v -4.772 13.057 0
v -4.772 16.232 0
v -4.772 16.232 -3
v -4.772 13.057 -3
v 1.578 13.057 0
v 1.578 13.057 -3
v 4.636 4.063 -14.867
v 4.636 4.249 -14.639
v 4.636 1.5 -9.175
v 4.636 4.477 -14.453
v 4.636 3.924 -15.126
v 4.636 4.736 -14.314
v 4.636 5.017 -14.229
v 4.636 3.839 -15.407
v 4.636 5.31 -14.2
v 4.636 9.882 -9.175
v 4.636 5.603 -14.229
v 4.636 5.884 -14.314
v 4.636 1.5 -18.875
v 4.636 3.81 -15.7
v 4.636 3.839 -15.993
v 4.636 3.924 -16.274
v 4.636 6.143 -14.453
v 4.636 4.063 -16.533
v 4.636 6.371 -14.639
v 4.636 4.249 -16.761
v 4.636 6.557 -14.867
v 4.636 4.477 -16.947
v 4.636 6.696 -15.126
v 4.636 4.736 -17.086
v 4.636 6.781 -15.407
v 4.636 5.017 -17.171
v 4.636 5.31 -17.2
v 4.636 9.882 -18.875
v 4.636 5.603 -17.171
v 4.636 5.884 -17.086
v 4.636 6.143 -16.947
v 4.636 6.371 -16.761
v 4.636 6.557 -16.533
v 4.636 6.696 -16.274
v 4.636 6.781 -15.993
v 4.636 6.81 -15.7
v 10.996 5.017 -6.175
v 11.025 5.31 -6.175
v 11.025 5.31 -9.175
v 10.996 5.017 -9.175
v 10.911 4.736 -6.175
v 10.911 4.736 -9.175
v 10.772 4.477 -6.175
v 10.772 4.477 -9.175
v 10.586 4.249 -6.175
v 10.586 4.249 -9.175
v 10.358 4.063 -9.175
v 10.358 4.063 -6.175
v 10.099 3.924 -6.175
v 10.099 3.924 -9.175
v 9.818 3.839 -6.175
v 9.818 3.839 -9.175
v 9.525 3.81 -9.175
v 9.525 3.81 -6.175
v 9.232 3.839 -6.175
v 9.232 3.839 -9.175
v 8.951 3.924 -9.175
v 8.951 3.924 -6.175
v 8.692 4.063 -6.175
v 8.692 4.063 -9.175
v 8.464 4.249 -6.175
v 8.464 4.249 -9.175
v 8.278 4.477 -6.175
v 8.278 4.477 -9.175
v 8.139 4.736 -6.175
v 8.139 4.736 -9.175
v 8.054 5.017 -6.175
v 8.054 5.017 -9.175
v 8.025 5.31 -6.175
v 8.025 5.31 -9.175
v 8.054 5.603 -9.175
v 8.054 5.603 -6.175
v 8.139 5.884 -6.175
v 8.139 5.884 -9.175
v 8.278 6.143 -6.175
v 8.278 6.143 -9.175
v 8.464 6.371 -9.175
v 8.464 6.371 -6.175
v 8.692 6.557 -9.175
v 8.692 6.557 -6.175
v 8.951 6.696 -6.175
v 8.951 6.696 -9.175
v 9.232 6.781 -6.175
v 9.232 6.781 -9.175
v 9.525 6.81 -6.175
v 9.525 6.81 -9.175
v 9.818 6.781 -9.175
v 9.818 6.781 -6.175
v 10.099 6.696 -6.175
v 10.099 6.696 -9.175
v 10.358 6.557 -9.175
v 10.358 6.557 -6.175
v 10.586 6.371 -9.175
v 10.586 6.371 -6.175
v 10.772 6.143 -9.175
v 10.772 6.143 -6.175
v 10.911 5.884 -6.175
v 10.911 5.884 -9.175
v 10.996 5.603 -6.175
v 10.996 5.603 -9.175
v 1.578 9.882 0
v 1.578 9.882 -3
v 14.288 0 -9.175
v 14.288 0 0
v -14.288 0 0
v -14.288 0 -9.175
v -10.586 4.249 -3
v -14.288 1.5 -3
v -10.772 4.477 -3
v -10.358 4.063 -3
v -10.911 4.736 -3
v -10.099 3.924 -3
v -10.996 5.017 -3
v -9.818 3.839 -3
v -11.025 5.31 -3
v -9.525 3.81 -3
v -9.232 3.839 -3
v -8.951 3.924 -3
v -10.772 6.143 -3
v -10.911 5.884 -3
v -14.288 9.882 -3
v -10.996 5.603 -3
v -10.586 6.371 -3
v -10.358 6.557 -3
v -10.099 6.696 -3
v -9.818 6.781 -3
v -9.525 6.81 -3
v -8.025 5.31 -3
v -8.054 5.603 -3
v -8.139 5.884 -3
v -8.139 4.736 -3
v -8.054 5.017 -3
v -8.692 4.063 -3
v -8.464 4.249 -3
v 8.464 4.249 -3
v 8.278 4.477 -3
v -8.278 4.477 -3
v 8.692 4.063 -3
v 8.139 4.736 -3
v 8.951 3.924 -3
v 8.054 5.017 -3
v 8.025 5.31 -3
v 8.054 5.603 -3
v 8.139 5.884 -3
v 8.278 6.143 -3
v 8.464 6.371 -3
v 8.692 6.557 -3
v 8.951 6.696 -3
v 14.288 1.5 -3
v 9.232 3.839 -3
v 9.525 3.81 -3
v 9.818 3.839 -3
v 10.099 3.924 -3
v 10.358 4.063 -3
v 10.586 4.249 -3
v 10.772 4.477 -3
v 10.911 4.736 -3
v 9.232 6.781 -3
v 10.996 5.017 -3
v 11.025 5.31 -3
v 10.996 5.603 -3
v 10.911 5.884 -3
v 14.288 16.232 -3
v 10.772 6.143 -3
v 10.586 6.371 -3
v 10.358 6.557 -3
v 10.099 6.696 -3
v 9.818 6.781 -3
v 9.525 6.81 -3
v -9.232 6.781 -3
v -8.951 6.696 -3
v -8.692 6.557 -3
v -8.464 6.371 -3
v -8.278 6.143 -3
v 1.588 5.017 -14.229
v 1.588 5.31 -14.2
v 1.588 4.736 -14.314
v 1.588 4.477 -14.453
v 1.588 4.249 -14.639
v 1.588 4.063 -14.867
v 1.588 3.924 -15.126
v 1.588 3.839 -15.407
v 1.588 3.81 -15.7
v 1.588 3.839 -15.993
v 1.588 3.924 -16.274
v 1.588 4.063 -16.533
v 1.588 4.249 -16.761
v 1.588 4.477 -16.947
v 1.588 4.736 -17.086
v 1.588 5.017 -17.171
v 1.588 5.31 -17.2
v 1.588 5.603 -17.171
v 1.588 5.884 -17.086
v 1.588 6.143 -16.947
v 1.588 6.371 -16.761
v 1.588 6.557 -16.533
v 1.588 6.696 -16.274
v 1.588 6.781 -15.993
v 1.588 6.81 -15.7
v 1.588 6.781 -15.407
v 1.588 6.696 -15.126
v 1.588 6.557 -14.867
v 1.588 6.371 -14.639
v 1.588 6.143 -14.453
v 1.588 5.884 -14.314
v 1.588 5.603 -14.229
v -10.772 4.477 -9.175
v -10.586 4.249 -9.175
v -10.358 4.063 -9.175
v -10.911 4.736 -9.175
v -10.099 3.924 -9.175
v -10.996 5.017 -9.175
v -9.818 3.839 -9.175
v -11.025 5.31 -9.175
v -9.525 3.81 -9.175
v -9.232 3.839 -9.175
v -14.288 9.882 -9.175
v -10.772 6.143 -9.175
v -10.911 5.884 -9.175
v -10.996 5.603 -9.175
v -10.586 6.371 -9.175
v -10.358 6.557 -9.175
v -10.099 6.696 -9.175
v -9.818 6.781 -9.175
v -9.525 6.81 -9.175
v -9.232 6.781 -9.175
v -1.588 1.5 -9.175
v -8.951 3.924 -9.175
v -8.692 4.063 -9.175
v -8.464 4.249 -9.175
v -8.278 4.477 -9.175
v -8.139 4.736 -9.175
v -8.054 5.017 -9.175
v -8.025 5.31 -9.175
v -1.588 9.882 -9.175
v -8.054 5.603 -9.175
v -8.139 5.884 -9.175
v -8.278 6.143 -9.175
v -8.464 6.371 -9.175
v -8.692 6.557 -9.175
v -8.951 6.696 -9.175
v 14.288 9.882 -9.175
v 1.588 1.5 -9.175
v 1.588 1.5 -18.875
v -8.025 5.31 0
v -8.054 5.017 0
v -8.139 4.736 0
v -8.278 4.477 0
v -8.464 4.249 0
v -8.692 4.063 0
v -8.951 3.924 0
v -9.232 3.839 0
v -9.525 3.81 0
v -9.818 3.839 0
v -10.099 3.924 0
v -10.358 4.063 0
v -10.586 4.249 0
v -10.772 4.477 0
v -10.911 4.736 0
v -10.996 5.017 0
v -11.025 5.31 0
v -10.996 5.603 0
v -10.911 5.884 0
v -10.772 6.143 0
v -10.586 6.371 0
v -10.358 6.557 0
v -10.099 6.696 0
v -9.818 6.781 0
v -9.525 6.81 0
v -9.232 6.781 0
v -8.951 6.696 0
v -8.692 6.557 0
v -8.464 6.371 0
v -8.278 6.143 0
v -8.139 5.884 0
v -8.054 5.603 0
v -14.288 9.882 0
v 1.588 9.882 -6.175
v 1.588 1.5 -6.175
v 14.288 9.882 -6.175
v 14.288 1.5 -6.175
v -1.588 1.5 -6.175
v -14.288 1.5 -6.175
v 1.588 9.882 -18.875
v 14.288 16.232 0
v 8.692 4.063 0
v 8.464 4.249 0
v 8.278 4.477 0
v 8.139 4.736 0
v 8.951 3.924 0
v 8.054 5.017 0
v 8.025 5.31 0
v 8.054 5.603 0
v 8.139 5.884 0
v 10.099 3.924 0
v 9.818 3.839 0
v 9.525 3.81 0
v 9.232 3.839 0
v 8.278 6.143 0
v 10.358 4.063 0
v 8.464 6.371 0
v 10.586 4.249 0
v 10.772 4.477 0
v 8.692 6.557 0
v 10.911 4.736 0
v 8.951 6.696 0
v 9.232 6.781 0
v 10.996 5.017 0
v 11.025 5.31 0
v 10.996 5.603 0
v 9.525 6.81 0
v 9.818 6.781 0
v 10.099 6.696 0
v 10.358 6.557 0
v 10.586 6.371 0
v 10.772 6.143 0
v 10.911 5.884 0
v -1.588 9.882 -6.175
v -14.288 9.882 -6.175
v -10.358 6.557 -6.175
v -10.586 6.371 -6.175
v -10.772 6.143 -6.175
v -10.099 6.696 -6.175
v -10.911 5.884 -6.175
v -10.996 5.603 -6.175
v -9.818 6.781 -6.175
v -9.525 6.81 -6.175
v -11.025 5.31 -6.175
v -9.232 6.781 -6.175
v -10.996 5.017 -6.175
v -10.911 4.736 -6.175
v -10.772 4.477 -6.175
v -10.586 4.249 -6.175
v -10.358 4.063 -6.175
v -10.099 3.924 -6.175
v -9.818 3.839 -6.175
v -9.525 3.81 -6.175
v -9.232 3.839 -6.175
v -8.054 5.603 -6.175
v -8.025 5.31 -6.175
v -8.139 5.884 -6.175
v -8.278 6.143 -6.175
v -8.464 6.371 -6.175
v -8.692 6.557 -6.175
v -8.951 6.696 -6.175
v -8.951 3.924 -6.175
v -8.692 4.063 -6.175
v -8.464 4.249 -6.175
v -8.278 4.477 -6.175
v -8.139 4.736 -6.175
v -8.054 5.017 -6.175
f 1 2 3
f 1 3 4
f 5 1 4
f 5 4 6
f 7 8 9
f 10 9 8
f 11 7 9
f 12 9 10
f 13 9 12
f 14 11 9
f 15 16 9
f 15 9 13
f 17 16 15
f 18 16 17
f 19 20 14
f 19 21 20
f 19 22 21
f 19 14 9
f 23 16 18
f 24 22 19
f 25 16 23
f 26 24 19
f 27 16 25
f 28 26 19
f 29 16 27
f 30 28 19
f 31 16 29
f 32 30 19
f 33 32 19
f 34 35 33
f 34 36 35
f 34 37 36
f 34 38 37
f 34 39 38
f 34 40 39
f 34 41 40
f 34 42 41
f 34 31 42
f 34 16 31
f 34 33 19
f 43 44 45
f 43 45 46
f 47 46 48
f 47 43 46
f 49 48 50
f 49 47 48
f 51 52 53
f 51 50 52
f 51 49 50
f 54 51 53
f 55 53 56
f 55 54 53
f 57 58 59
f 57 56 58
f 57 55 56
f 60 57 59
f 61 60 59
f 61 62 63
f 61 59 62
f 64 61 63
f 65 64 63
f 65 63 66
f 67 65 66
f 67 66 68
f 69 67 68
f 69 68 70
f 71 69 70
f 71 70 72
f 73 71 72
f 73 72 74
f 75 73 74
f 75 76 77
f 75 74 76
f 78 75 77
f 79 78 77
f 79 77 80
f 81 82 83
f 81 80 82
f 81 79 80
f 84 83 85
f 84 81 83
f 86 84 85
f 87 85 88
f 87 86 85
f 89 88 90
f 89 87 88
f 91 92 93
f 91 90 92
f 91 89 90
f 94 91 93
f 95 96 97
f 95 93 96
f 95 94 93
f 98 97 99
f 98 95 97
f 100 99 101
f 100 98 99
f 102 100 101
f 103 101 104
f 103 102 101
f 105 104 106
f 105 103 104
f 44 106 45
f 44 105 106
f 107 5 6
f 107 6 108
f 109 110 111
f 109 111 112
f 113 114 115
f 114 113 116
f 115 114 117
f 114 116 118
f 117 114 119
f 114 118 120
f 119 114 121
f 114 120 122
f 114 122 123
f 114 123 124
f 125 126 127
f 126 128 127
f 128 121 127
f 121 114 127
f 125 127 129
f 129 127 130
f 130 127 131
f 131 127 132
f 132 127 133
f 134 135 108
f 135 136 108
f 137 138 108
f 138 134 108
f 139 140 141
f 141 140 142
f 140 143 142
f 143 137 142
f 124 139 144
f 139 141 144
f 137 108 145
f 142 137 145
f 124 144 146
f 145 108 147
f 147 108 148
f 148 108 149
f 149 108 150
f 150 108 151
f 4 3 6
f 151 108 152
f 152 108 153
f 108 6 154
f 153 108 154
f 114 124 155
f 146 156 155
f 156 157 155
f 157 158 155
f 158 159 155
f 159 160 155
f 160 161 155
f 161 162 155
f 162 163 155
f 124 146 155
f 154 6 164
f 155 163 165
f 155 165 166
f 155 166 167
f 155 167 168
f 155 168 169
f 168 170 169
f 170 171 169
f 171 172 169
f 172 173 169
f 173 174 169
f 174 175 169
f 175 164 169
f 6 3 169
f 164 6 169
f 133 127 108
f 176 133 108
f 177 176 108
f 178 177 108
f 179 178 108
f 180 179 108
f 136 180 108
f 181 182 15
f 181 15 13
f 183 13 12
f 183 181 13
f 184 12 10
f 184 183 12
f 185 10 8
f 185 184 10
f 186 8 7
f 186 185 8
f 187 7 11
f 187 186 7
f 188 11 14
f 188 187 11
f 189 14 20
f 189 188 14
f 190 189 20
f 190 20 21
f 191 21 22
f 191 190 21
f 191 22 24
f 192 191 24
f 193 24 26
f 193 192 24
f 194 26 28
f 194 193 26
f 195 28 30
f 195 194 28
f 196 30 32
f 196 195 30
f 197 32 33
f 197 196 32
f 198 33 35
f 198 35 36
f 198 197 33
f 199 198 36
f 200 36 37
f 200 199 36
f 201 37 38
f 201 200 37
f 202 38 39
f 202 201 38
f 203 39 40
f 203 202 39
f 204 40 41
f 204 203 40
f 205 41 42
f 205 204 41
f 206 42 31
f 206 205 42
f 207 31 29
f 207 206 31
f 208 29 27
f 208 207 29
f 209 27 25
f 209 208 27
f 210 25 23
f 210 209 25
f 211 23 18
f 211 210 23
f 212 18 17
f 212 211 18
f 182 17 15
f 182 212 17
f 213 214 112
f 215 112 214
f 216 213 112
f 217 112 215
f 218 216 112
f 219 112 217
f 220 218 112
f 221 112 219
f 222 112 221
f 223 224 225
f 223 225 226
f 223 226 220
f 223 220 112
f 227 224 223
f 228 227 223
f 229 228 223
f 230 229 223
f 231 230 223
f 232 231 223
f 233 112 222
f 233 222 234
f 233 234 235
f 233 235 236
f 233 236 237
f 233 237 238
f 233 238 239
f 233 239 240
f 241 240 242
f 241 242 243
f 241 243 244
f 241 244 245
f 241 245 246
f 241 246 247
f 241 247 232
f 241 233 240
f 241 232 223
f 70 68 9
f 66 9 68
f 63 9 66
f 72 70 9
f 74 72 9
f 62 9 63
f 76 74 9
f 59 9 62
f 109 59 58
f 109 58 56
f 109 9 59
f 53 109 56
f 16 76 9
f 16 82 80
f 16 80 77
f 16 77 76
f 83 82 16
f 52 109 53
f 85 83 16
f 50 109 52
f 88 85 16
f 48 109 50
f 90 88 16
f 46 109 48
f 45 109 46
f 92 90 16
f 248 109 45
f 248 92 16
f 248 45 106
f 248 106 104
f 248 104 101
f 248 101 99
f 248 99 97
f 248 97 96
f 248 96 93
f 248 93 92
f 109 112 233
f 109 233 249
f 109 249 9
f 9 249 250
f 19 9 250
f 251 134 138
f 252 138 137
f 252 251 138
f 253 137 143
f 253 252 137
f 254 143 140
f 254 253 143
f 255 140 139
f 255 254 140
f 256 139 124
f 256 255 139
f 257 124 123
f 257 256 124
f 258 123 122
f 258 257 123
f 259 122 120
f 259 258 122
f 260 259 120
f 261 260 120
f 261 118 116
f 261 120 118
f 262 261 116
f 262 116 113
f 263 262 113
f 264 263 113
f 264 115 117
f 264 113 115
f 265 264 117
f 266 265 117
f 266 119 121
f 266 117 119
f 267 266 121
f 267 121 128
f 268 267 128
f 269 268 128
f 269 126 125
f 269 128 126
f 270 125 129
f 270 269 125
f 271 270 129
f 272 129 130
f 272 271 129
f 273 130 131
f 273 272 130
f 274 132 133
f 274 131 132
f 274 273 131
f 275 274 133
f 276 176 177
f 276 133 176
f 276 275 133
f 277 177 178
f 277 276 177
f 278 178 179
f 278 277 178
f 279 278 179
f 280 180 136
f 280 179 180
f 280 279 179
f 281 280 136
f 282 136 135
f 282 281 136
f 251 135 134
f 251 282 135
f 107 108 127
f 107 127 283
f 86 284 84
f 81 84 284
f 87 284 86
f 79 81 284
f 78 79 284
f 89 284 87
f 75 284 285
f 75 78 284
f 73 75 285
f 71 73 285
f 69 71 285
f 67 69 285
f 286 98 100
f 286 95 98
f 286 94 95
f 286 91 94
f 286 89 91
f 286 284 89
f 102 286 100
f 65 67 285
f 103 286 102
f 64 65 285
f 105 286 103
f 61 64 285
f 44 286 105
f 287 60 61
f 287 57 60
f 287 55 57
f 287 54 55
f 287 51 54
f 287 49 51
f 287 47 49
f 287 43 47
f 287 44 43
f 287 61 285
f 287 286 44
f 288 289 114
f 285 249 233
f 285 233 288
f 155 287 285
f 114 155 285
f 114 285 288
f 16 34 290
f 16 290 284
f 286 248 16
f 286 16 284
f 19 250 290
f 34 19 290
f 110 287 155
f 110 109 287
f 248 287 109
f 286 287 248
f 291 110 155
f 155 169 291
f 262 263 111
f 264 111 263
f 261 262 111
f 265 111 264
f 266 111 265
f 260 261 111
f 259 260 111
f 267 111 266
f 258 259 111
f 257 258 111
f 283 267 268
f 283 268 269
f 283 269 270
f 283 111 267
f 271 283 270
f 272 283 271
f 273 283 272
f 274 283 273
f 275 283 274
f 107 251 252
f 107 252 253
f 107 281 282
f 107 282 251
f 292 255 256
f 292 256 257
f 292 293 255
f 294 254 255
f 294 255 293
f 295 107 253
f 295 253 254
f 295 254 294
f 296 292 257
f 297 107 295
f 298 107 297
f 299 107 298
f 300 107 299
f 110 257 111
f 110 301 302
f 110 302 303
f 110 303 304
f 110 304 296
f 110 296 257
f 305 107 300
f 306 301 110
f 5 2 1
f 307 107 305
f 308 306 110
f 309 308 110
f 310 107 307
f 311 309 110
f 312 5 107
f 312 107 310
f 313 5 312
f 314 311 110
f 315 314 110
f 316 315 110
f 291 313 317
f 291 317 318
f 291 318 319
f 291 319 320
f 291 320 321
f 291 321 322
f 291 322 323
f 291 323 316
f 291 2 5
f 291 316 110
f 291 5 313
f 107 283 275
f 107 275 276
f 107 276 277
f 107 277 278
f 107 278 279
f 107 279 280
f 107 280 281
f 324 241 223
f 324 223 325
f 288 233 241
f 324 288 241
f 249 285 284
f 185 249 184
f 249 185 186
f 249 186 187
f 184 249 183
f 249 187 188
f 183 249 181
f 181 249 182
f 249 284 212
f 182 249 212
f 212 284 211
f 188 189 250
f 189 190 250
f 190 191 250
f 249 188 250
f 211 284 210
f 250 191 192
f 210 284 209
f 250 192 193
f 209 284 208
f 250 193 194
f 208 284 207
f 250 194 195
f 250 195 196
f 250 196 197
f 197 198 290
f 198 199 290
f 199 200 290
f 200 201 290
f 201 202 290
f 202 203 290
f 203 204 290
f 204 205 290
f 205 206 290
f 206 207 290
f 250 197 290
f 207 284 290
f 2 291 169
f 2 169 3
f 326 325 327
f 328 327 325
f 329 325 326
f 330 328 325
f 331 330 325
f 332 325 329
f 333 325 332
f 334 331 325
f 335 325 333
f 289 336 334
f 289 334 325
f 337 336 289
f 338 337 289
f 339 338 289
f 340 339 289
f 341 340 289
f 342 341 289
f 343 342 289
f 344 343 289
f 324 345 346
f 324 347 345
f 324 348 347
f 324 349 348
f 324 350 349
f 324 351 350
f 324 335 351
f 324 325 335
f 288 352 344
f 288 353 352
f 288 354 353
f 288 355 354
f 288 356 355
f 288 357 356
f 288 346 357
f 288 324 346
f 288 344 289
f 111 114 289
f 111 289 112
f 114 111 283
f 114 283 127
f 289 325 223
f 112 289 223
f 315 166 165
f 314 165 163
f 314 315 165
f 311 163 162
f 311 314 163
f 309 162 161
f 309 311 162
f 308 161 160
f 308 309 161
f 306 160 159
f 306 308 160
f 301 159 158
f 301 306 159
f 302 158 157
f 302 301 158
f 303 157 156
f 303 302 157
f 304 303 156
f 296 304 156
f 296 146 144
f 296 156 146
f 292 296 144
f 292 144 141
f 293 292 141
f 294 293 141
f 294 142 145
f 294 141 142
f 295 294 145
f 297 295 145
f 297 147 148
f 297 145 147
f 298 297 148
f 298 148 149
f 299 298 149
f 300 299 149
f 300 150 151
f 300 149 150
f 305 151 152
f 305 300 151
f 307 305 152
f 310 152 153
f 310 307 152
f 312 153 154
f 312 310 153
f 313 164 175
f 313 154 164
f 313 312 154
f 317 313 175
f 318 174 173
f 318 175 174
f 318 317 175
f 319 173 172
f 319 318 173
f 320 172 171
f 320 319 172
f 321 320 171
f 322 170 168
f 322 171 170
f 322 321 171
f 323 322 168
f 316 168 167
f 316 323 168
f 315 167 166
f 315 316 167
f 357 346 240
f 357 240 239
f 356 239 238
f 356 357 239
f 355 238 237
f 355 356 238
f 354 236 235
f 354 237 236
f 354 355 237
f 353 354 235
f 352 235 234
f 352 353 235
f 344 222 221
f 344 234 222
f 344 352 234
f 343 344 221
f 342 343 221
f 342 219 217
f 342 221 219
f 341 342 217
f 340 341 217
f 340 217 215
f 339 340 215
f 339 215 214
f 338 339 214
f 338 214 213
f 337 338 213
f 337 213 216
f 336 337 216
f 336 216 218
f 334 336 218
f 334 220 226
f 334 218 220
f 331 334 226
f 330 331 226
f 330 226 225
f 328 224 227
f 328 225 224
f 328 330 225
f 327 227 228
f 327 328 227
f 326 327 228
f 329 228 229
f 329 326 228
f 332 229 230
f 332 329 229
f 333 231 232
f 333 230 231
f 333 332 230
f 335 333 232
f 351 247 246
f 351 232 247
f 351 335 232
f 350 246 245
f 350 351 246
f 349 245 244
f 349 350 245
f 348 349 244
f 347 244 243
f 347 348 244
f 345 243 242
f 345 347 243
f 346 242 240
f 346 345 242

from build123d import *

# Parameters (mm, degrees)
BOSS_EXTRUDE1_DEPTH    = 14.2875
SKETCH4_R              = 1.5
CUT_EXTRUDE1_DEPTH     = 20.646048082
CUT_EXTRUDE3_REACH     = 21.646
SKETCH8_W              = 3.175
SKETCH8_H              = 8.382
SKETCH6_W              = 9.7
SKETCH6_H              = 8.382
SKETCH6_R              = 1.5
BOSS_EXTRUDE4_DEPTH    = 3.048
RIGHT_RAMP_MOUNT_DEPTH = 3


with BuildPart() as part:
    # Sketch2 → Boss-Extrude1 (new, symmetric)
    with BuildSketch(Plane(origin=(0, 0, 0), x_dir=(0, 0, -1), z_dir=(1, 0, 0))):
        Polygon((3, 1.5), (3, 9.882), (0, 9.882), (0, 0), (6.175, 0), (6.175, 1.5), align=None)
        Polygon((6.175, 1.5), (6.175, 0), (9.175, 0), (9.175, 9.882), (6.175, 9.882), align=None)
    extrude(amount=BOSS_EXTRUDE1_DEPTH, both=True)

    # Sketch4 → Cut-Extrude1 (cut, through all)
    with BuildSketch(Plane(origin=(0, 0, 0), x_dir=(-1, 0, 0), z_dir=(0, 0, -1))):
        with Locations(Location((-9.525, 5.31, 0), (0, 0, 180))):
            Circle(SKETCH4_R)
        with Locations(Location((9.525, 5.31, 0), (0, 0, 180))):
            Circle(SKETCH4_R)
    extrude(amount=CUT_EXTRUDE1_DEPTH, mode=Mode.SUBTRACT)

    # Sketch8 → Cut-Extrude3 (cut, up to next)
    with BuildSketch(Plane(origin=(0, 0, -9.175), x_dir=(-1, 0, 0), z_dir=(0, 0, -1)), mode=Mode.PRIVATE) as cut_extrude3_sk1:
        with Locations((0, 5.691)):
            Rectangle(SKETCH8_W, SKETCH8_H)
    cut_extrude3_tool1 = extrude(cut_extrude3_sk1.sketch, amount=-CUT_EXTRUDE3_REACH, mode=Mode.PRIVATE) & part.part
    add(cut_extrude3_tool1.solids().sort_by_distance((0, 5.691, -9.175))[0], mode=Mode.SUBTRACT)

    # Sketch6 → Boss-Extrude4 (add)
    with BuildSketch(Plane(origin=(1.5875, 0, 0), x_dir=(0, 0, -1), z_dir=(1, 0, 0))):
        with Locations((14.025, 5.691)):
            Rectangle(SKETCH6_W, SKETCH6_H)
        with Locations(Location((15.7, 5.31, 0), (0, 0, 180))):
            Circle(SKETCH6_R, mode=Mode.SUBTRACT)
    extrude(amount=BOSS_EXTRUDE4_DEPTH)

    # Sketch9 → Right Ramp Mount (add)
    with BuildSketch(Plane.XY):
        Polygon((1.5785, 9.882), (14.2875, 9.882), (14.2875, 16.232), (-4.7715, 16.232), (-4.7715, 13.057), (1.5785, 13.057), align=None)
    extrude(amount=-RIGHT_RAMP_MOUNT_DEPTH)


solid = part.part
